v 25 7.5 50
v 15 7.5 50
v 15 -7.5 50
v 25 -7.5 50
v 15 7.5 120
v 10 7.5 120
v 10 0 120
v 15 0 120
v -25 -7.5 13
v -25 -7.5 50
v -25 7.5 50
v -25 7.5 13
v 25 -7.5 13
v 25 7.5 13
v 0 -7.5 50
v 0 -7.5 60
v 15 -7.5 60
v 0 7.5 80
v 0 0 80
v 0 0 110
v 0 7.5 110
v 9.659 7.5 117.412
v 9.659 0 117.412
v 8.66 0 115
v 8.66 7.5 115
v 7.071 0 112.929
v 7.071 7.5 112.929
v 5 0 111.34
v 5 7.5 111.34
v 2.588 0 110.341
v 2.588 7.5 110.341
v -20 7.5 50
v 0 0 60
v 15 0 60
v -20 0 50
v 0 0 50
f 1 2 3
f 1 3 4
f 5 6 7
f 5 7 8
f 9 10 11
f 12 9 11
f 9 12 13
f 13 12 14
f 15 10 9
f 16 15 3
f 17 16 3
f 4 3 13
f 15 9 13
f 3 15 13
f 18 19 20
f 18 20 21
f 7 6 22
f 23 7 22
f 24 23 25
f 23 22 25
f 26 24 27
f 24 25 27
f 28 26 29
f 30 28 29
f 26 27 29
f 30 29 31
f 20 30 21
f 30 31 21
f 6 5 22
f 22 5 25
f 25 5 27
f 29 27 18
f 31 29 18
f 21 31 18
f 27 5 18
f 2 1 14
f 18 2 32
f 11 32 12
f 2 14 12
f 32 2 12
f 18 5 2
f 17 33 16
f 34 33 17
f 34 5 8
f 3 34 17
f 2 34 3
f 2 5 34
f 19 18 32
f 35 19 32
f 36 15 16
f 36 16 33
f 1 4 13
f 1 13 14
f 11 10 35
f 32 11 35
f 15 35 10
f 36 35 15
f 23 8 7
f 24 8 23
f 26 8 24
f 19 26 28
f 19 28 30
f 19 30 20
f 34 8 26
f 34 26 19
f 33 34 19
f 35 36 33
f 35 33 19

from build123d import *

# Parameters (mm, degrees)
SKETCH_1_W               = 50
SKETCH_1_H               = 15
EXTRUDE_1_DEPTH          = 60
SKETCH_2_W               = 15
SKETCH_2_H               = 15
EXTRUDE_2_DEPTH          = 60
SKETCH_3_W               = 15
SKETCH_3_H               = 7.5
CUT_EXTRUDE_1_DEPTH      = 60
CUT_EXTRUDE_2_DEPTH      = 10
SKETCH_6_W               = 10
SKETCH_6_H               = 10
SKETCH_6_W_2             = 25
CUT_EXTRUDE_3_DEPTH      = 20
EXTRUDE_3_DEPTH          = 7.5
CUT_EXTRUDE_4_DEPTH      = 124.490890352
CUT_EXTRUDE_4_DEPTH_BACK = 124.490890352
SKETCH_7_W               = 82.157848782
SKETCH_7_H               = 26


with BuildPart() as part:
    # 스케치1 → 보스-돌출1 (new body)
    with BuildSketch(Plane.XY):
        Rectangle(SKETCH_1_W, SKETCH_1_H)
    extrude(amount=EXTRUDE_1_DEPTH)

    # 스케치2 → 보스-돌출2 (add)
    with BuildSketch(Plane.XY.offset(60)):
        with Locations((7.5, 0)):
            Rectangle(SKETCH_2_W, SKETCH_2_H)
    extrude(amount=EXTRUDE_2_DEPTH)

    # 스케치3 → 컷-돌출1 (cut)
    with BuildSketch(Plane.XY.offset(120)):
        with Locations((7.5, -3.75)):
            Rectangle(SKETCH_3_W, SKETCH_3_H)
    extrude(amount=-CUT_EXTRUDE_1_DEPTH, mode=Mode.SUBTRACT)

    # 스케치4 → 컷-돌출2 (cut)
    with BuildSketch(Plane(origin=(0, 7.5, 0), x_dir=(1, 0, 0), z_dir=(0, 1, 0))):
        with BuildLine():
            Line((0, -110), (0, -120))
            Line((0, -120), (10, -120))
            ThreePointArc((10, -120), (7.071067812, -112.928932188), (0, -110))
        make_face()
    extrude(amount=-CUT_EXTRUDE_2_DEPTH, mode=Mode.SUBTRACT)

    # 스케치6 → 컷-돌출3 (cut)
    with BuildSketch(Plane(origin=(0, 7.5, 0), x_dir=(1, 0, 0), z_dir=(0, 1, 0))):
        with Locations((20, -55)):
            Rectangle(SKETCH_6_W, SKETCH_6_H)
        with Locations((-12.5, -55)):
            Rectangle(SKETCH_6_W_2, SKETCH_6_H)
    extrude(amount=-CUT_EXTRUDE_3_DEPTH, mode=Mode.SUBTRACT)

    # 스케치5 → 보스-돌출3 (add)
    with BuildSketch(Plane(origin=(0, 7.5, 0), x_dir=(1, 0, 0), z_dir=(0, 1, 0))):
        Polygon((0, -50), (0, -80), (-20, -50), align=None)
    extrude(amount=-EXTRUDE_3_DEPTH)

    # 스케치7 → 컷-돌출4 (cut, two sides: drawn at the far end of the back side and taken through both)
    with BuildSketch(Plane.XZ.offset(7.5).offset(-CUT_EXTRUDE_4_DEPTH_BACK)):
        Rectangle(SKETCH_7_W, SKETCH_7_H)
    extrude(amount=CUT_EXTRUDE_4_DEPTH + CUT_EXTRUDE_4_DEPTH_BACK, mode=Mode.SUBTRACT)


solid = part.part
